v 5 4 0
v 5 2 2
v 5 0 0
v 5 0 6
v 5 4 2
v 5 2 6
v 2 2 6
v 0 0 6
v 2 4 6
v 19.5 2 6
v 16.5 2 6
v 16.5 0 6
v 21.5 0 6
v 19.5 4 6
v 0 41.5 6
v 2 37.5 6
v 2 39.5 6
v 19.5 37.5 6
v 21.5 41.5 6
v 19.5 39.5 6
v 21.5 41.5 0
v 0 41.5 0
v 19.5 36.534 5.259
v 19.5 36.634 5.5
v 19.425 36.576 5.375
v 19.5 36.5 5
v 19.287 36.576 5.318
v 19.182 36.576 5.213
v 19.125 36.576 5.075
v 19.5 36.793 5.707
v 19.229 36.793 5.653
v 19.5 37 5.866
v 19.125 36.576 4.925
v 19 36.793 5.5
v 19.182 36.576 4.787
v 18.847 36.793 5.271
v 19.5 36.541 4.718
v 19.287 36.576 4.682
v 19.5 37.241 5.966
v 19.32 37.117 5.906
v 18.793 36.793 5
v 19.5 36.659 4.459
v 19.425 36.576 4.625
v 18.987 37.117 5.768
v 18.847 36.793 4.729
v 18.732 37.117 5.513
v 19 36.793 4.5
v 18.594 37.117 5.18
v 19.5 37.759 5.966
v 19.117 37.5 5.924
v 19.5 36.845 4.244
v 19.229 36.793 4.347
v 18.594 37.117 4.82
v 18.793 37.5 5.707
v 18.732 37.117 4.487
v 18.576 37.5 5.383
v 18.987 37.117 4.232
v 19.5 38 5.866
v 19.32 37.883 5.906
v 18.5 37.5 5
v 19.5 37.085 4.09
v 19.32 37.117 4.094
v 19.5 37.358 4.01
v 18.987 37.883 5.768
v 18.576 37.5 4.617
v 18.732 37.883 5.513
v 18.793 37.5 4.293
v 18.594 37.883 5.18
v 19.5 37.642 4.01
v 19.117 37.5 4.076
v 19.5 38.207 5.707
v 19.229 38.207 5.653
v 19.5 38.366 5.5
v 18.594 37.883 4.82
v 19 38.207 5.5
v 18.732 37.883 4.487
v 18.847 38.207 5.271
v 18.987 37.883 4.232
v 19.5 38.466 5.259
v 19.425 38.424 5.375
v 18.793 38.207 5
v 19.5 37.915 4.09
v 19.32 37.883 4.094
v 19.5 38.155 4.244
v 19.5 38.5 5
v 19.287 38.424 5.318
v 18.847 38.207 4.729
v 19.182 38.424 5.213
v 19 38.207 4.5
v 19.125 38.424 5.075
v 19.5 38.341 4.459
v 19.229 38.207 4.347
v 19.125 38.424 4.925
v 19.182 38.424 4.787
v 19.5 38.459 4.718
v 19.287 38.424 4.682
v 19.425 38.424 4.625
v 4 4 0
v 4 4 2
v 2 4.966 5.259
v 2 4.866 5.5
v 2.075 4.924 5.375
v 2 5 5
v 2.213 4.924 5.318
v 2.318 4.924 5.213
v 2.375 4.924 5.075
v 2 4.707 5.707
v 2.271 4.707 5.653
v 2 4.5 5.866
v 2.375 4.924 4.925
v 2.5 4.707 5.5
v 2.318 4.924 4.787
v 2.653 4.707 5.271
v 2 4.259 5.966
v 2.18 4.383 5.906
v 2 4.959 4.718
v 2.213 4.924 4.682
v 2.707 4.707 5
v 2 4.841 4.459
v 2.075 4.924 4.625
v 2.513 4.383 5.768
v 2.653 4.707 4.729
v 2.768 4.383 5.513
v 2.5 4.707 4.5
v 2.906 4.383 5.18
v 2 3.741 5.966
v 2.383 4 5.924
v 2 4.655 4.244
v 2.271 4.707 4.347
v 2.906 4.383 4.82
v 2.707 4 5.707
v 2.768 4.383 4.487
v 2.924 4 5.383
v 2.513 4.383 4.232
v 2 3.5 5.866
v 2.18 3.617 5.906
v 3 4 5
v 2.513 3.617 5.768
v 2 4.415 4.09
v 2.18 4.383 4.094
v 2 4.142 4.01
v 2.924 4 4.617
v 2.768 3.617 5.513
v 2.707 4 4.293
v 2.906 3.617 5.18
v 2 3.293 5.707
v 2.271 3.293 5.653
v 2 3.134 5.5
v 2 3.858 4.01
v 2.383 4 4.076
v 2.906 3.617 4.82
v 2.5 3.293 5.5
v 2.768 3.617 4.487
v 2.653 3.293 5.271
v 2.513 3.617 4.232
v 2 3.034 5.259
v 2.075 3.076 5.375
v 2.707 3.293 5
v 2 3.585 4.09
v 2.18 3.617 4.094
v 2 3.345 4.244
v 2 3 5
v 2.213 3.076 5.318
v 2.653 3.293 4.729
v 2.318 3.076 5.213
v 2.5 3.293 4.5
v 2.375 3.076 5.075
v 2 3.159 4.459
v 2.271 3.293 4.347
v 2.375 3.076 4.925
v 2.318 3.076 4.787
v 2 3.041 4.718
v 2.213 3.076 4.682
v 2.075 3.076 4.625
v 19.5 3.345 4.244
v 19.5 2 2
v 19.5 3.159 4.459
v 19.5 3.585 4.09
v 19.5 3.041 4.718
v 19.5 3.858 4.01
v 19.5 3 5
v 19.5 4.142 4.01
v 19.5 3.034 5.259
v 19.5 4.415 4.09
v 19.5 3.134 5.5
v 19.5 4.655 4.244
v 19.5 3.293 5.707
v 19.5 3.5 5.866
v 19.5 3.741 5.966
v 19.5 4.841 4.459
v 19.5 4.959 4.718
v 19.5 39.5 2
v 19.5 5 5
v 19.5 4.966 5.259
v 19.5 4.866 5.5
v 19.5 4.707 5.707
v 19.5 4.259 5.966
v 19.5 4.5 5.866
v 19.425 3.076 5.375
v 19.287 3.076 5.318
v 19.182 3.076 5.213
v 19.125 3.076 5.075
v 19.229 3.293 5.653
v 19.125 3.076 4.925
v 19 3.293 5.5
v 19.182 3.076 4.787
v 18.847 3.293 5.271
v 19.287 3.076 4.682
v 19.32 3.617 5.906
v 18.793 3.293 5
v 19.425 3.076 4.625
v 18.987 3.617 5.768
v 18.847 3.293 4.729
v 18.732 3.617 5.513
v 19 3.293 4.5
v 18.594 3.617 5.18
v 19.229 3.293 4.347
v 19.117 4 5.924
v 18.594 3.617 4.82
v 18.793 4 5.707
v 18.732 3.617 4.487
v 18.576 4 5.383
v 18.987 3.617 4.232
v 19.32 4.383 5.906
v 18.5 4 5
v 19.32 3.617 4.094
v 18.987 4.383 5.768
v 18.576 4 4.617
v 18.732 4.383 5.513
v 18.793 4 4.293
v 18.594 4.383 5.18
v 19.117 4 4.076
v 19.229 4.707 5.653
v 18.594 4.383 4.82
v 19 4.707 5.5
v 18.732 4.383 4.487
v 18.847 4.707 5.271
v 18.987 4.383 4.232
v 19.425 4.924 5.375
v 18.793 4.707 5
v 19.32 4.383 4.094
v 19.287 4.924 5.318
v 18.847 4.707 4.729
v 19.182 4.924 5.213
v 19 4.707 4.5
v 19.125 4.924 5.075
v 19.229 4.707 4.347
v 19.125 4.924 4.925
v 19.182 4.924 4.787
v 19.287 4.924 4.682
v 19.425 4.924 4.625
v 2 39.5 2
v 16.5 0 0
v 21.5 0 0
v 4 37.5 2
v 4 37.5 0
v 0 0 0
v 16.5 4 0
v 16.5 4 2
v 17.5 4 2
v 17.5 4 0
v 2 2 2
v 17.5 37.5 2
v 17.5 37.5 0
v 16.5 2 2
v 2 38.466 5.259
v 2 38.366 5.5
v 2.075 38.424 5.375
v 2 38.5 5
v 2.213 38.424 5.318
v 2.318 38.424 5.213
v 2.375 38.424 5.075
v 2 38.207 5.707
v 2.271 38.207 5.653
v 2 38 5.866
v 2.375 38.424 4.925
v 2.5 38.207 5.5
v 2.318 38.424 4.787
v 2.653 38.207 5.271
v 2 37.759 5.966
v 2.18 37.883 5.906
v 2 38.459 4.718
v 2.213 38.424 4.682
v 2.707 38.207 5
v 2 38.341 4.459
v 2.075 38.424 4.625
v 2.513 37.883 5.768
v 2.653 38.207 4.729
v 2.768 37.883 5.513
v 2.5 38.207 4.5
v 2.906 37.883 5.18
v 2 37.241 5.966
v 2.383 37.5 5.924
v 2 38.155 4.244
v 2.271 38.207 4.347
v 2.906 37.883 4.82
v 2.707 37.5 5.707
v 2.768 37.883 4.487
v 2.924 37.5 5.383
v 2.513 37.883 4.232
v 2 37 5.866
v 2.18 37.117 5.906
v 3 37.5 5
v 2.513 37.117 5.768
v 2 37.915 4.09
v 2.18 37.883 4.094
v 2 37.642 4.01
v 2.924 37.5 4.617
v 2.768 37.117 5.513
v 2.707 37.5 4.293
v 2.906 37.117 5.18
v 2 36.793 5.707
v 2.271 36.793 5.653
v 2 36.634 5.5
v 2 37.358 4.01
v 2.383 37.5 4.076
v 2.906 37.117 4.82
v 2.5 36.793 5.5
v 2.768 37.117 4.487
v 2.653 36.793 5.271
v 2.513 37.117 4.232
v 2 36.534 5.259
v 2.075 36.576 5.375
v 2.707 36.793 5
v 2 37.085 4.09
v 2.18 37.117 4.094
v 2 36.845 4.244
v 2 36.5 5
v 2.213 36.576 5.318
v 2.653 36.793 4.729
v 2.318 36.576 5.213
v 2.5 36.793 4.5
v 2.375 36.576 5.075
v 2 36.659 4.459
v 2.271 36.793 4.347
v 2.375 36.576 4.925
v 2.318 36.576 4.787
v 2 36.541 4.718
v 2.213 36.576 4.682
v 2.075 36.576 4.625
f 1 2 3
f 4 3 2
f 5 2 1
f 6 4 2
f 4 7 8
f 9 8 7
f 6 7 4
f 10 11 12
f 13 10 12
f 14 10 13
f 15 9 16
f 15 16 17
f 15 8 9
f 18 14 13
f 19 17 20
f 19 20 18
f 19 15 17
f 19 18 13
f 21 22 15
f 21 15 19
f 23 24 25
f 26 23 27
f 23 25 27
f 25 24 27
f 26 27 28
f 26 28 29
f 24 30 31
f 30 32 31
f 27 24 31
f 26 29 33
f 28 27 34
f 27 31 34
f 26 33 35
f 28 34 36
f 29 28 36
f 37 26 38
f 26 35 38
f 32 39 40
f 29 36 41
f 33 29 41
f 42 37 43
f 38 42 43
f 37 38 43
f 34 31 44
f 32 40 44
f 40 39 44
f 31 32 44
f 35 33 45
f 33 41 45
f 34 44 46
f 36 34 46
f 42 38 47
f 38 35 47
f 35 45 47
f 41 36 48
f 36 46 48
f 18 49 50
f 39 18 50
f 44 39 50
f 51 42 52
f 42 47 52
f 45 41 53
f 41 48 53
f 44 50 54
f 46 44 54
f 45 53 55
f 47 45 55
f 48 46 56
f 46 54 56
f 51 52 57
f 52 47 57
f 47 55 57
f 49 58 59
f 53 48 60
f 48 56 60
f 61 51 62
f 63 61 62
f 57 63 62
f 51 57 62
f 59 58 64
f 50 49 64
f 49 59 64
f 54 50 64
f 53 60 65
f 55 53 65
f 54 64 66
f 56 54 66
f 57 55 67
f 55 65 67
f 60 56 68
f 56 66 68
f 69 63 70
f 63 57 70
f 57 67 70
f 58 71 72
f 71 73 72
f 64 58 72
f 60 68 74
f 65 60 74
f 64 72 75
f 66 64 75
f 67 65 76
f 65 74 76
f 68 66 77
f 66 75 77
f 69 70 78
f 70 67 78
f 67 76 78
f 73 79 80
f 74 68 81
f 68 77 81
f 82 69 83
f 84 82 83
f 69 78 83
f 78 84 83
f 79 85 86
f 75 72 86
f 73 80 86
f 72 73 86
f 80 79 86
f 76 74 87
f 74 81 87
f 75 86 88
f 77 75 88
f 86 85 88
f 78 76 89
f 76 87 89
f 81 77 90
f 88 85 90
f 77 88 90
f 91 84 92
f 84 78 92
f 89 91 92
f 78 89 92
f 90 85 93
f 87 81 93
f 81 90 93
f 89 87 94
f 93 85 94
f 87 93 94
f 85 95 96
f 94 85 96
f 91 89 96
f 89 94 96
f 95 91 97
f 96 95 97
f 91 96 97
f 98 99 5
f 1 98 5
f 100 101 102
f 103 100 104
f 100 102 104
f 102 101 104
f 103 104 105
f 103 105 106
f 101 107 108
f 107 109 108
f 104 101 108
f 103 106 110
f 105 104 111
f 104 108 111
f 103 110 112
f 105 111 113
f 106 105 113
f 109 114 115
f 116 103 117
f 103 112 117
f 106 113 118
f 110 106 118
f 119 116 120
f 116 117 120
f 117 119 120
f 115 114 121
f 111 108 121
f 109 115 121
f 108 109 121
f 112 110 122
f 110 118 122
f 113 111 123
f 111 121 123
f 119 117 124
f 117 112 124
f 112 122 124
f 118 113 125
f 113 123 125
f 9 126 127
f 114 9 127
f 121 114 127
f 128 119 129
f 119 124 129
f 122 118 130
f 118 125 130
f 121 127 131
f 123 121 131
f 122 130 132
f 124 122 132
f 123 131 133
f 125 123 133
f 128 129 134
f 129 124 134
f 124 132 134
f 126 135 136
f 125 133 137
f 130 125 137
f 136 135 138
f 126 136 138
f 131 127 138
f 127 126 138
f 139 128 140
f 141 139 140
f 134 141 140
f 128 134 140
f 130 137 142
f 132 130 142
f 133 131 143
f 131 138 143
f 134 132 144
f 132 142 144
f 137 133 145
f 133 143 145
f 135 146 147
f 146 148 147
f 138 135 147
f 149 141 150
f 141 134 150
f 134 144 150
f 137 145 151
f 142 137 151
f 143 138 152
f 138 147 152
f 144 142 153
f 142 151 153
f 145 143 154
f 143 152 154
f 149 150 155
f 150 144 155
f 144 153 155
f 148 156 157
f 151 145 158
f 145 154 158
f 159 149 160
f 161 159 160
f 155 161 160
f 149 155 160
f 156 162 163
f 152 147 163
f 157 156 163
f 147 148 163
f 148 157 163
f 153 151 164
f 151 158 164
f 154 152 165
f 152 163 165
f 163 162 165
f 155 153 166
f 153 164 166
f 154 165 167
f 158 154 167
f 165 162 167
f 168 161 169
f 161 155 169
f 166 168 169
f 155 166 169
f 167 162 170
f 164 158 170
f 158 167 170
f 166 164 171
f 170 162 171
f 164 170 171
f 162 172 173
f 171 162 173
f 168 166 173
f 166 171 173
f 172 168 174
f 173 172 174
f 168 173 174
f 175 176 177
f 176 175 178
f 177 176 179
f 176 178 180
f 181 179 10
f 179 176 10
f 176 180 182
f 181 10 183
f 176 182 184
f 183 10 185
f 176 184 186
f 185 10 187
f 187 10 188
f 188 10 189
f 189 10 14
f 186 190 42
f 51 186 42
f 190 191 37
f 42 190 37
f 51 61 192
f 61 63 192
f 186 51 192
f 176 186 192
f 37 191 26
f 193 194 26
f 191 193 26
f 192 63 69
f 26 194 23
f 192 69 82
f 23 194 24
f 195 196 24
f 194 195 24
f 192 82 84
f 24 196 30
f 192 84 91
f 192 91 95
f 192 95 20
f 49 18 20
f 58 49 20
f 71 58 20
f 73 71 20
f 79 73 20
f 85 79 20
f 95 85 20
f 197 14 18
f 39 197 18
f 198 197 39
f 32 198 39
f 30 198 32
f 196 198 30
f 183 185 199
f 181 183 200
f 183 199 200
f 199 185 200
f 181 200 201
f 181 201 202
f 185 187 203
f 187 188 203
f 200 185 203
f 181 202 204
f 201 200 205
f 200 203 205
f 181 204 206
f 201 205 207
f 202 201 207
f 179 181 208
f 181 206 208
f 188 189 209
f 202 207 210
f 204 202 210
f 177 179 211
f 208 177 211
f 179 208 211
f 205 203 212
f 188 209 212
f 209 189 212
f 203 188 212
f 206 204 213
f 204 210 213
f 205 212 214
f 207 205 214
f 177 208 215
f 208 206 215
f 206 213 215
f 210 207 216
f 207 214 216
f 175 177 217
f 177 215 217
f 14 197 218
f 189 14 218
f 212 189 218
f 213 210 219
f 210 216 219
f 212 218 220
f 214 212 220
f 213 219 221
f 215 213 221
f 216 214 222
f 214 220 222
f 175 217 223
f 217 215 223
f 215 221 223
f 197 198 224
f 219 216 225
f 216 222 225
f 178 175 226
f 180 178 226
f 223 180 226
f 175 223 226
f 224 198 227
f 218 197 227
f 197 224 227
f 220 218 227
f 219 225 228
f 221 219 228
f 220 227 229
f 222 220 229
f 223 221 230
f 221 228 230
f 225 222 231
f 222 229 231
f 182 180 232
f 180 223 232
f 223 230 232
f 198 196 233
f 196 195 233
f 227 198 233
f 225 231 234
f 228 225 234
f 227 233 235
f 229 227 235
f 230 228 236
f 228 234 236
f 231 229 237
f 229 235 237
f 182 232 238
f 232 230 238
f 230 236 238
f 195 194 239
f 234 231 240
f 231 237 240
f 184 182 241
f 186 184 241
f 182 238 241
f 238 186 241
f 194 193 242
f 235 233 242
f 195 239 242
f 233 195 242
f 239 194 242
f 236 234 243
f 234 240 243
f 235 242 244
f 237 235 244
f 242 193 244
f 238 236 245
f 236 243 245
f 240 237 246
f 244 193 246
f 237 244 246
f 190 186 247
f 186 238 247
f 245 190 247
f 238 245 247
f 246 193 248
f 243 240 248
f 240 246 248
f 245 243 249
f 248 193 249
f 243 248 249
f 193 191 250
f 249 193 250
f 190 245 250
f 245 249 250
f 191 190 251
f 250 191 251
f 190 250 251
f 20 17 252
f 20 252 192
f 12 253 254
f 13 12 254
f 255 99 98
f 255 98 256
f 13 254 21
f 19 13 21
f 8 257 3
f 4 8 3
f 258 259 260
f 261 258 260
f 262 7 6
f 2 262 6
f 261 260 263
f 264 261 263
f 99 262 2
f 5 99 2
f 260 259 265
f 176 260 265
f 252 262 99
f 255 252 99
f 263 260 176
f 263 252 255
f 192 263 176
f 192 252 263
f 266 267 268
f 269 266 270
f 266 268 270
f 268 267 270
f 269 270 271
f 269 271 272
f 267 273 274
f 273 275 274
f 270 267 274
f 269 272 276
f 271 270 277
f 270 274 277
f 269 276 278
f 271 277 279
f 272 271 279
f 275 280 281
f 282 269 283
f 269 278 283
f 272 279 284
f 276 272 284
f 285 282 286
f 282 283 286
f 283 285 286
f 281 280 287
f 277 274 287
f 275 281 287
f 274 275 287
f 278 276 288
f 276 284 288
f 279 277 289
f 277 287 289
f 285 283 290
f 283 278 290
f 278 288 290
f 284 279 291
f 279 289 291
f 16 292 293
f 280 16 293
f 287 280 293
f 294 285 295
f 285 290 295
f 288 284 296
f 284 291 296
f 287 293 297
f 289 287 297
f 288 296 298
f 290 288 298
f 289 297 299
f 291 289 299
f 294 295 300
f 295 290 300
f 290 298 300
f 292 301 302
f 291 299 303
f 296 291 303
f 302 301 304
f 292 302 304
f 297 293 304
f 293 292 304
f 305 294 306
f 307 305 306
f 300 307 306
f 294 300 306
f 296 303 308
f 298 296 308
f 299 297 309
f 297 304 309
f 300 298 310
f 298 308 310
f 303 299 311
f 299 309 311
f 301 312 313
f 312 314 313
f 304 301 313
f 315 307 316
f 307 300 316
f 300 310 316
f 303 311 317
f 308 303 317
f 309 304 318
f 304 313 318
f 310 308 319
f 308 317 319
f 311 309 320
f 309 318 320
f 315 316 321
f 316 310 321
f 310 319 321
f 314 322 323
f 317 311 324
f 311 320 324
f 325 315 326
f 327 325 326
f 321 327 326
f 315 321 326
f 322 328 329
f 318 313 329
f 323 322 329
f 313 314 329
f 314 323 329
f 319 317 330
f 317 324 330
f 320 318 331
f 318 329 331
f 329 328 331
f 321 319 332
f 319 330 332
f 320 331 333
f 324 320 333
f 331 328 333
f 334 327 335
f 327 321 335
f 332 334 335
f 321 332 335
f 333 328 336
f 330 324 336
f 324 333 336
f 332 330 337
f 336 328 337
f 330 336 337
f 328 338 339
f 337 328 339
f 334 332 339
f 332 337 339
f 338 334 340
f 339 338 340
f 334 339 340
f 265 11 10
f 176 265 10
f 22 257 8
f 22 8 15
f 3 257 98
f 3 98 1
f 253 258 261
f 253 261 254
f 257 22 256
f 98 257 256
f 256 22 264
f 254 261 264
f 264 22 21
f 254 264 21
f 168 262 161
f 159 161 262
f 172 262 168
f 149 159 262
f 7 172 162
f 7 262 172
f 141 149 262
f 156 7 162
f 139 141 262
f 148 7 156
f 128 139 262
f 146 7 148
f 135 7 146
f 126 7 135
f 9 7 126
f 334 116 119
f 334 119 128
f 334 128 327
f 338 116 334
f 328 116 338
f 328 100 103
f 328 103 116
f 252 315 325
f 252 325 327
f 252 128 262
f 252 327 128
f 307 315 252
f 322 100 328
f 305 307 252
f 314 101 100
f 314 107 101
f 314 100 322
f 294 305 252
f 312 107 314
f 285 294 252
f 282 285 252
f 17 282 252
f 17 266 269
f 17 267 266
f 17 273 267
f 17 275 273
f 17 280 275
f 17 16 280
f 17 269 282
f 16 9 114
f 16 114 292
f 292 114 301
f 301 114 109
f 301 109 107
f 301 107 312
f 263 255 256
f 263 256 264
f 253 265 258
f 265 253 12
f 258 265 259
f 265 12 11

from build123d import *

# Parameters (mm, degrees)
SKETCH057_W         = 21.5
SKETCH057_H         = 41.5
PAD033_DEPTH        = 6
SKETCH056_W         = 17.5
SKETCH056_H         = 37.5
POCKET018_DEPTH     = 4
SKETCH059_W         = 13.5
SKETCH059_H         = 33.5
POCKET019_DEPTH     = 2.001
SKETCH058_W         = 11.5
SKETCH058_H         = 4
POCKET017_DEPTH     = 6.001
REVOLUTION003_ANGLE = 180
REVOLUTION004_ANGLE = 180


with BuildPart() as part:
    # Sketch057 → Pad033 (new body)
    with BuildSketch(Plane.XY):
        with Locations((10.75, 20.75)):
            Rectangle(SKETCH057_W, SKETCH057_H)
    extrude(amount=PAD033_DEPTH)

    # Sketch056 (on Face6 of Pad033) → Pocket018 (cut)
    with BuildSketch(Plane.XY.offset(6)):
        with Locations((10.75, 20.75)):
            Rectangle(SKETCH056_W, SKETCH056_H)
    extrude(amount=-POCKET018_DEPTH, mode=Mode.SUBTRACT)

    # Sketch059 (on Face11 of Pocket018) → Pocket019 (cut, through all)
    with BuildSketch(Plane.XY.offset(2)):
        with Locations((10.75, 20.75)):
            Rectangle(SKETCH059_W, SKETCH059_H)
    extrude(amount=-POCKET019_DEPTH, mode=Mode.SUBTRACT)

    # Sketch058 (on Face5 of Pocket019) → Pocket017 (cut, through all)
    with BuildSketch(Plane.XY.offset(6)):
        with Locations((10.75, 2)):
            Rectangle(SKETCH058_W, SKETCH058_H)
    extrude(amount=-POCKET017_DEPTH, mode=Mode.SUBTRACT)

    # Sketch060 (on Face20 of Pocket017) → Revolution003 (revolve)
    with BuildSketch(Plane.YZ.offset(2)):
        with BuildLine():
            ThreePointArc((5, 5), (4, 6), (3, 5))
            Line((3, 5), (5, 5))
        make_face()
        with BuildLine():
            ThreePointArc((38.5, 5), (37.5, 6), (36.5, 5))
            Line((36.5, 5), (38.5, 5))
        make_face()
    revolve(axis=Axis((2, 5, 5), (0, 1, 0)), revolution_arc=REVOLUTION003_ANGLE)

    # Sketch061 (on Face19 of Revolution003) → Revolution004 (revolve)
    with BuildSketch(Plane(origin=(19.5, 0, 0), x_dir=(0, -1, 0), z_dir=(-1, 0, 0))):
        with BuildLine():
            ThreePointArc((-36.5, 5), (-37.5, 6), (-38.5, 5))
            Line((-38.5, 5), (-36.5, 5))
        make_face()
        with BuildLine():
            ThreePointArc((-3, 5), (-4, 6), (-5, 5))
            Line((-5, 5), (-3, 5))
        make_face()
    revolve(axis=Axis((19.5, 36.5, 5), (0, -1, 0)), revolution_arc=REVOLUTION004_ANGLE)


solid = part.part
